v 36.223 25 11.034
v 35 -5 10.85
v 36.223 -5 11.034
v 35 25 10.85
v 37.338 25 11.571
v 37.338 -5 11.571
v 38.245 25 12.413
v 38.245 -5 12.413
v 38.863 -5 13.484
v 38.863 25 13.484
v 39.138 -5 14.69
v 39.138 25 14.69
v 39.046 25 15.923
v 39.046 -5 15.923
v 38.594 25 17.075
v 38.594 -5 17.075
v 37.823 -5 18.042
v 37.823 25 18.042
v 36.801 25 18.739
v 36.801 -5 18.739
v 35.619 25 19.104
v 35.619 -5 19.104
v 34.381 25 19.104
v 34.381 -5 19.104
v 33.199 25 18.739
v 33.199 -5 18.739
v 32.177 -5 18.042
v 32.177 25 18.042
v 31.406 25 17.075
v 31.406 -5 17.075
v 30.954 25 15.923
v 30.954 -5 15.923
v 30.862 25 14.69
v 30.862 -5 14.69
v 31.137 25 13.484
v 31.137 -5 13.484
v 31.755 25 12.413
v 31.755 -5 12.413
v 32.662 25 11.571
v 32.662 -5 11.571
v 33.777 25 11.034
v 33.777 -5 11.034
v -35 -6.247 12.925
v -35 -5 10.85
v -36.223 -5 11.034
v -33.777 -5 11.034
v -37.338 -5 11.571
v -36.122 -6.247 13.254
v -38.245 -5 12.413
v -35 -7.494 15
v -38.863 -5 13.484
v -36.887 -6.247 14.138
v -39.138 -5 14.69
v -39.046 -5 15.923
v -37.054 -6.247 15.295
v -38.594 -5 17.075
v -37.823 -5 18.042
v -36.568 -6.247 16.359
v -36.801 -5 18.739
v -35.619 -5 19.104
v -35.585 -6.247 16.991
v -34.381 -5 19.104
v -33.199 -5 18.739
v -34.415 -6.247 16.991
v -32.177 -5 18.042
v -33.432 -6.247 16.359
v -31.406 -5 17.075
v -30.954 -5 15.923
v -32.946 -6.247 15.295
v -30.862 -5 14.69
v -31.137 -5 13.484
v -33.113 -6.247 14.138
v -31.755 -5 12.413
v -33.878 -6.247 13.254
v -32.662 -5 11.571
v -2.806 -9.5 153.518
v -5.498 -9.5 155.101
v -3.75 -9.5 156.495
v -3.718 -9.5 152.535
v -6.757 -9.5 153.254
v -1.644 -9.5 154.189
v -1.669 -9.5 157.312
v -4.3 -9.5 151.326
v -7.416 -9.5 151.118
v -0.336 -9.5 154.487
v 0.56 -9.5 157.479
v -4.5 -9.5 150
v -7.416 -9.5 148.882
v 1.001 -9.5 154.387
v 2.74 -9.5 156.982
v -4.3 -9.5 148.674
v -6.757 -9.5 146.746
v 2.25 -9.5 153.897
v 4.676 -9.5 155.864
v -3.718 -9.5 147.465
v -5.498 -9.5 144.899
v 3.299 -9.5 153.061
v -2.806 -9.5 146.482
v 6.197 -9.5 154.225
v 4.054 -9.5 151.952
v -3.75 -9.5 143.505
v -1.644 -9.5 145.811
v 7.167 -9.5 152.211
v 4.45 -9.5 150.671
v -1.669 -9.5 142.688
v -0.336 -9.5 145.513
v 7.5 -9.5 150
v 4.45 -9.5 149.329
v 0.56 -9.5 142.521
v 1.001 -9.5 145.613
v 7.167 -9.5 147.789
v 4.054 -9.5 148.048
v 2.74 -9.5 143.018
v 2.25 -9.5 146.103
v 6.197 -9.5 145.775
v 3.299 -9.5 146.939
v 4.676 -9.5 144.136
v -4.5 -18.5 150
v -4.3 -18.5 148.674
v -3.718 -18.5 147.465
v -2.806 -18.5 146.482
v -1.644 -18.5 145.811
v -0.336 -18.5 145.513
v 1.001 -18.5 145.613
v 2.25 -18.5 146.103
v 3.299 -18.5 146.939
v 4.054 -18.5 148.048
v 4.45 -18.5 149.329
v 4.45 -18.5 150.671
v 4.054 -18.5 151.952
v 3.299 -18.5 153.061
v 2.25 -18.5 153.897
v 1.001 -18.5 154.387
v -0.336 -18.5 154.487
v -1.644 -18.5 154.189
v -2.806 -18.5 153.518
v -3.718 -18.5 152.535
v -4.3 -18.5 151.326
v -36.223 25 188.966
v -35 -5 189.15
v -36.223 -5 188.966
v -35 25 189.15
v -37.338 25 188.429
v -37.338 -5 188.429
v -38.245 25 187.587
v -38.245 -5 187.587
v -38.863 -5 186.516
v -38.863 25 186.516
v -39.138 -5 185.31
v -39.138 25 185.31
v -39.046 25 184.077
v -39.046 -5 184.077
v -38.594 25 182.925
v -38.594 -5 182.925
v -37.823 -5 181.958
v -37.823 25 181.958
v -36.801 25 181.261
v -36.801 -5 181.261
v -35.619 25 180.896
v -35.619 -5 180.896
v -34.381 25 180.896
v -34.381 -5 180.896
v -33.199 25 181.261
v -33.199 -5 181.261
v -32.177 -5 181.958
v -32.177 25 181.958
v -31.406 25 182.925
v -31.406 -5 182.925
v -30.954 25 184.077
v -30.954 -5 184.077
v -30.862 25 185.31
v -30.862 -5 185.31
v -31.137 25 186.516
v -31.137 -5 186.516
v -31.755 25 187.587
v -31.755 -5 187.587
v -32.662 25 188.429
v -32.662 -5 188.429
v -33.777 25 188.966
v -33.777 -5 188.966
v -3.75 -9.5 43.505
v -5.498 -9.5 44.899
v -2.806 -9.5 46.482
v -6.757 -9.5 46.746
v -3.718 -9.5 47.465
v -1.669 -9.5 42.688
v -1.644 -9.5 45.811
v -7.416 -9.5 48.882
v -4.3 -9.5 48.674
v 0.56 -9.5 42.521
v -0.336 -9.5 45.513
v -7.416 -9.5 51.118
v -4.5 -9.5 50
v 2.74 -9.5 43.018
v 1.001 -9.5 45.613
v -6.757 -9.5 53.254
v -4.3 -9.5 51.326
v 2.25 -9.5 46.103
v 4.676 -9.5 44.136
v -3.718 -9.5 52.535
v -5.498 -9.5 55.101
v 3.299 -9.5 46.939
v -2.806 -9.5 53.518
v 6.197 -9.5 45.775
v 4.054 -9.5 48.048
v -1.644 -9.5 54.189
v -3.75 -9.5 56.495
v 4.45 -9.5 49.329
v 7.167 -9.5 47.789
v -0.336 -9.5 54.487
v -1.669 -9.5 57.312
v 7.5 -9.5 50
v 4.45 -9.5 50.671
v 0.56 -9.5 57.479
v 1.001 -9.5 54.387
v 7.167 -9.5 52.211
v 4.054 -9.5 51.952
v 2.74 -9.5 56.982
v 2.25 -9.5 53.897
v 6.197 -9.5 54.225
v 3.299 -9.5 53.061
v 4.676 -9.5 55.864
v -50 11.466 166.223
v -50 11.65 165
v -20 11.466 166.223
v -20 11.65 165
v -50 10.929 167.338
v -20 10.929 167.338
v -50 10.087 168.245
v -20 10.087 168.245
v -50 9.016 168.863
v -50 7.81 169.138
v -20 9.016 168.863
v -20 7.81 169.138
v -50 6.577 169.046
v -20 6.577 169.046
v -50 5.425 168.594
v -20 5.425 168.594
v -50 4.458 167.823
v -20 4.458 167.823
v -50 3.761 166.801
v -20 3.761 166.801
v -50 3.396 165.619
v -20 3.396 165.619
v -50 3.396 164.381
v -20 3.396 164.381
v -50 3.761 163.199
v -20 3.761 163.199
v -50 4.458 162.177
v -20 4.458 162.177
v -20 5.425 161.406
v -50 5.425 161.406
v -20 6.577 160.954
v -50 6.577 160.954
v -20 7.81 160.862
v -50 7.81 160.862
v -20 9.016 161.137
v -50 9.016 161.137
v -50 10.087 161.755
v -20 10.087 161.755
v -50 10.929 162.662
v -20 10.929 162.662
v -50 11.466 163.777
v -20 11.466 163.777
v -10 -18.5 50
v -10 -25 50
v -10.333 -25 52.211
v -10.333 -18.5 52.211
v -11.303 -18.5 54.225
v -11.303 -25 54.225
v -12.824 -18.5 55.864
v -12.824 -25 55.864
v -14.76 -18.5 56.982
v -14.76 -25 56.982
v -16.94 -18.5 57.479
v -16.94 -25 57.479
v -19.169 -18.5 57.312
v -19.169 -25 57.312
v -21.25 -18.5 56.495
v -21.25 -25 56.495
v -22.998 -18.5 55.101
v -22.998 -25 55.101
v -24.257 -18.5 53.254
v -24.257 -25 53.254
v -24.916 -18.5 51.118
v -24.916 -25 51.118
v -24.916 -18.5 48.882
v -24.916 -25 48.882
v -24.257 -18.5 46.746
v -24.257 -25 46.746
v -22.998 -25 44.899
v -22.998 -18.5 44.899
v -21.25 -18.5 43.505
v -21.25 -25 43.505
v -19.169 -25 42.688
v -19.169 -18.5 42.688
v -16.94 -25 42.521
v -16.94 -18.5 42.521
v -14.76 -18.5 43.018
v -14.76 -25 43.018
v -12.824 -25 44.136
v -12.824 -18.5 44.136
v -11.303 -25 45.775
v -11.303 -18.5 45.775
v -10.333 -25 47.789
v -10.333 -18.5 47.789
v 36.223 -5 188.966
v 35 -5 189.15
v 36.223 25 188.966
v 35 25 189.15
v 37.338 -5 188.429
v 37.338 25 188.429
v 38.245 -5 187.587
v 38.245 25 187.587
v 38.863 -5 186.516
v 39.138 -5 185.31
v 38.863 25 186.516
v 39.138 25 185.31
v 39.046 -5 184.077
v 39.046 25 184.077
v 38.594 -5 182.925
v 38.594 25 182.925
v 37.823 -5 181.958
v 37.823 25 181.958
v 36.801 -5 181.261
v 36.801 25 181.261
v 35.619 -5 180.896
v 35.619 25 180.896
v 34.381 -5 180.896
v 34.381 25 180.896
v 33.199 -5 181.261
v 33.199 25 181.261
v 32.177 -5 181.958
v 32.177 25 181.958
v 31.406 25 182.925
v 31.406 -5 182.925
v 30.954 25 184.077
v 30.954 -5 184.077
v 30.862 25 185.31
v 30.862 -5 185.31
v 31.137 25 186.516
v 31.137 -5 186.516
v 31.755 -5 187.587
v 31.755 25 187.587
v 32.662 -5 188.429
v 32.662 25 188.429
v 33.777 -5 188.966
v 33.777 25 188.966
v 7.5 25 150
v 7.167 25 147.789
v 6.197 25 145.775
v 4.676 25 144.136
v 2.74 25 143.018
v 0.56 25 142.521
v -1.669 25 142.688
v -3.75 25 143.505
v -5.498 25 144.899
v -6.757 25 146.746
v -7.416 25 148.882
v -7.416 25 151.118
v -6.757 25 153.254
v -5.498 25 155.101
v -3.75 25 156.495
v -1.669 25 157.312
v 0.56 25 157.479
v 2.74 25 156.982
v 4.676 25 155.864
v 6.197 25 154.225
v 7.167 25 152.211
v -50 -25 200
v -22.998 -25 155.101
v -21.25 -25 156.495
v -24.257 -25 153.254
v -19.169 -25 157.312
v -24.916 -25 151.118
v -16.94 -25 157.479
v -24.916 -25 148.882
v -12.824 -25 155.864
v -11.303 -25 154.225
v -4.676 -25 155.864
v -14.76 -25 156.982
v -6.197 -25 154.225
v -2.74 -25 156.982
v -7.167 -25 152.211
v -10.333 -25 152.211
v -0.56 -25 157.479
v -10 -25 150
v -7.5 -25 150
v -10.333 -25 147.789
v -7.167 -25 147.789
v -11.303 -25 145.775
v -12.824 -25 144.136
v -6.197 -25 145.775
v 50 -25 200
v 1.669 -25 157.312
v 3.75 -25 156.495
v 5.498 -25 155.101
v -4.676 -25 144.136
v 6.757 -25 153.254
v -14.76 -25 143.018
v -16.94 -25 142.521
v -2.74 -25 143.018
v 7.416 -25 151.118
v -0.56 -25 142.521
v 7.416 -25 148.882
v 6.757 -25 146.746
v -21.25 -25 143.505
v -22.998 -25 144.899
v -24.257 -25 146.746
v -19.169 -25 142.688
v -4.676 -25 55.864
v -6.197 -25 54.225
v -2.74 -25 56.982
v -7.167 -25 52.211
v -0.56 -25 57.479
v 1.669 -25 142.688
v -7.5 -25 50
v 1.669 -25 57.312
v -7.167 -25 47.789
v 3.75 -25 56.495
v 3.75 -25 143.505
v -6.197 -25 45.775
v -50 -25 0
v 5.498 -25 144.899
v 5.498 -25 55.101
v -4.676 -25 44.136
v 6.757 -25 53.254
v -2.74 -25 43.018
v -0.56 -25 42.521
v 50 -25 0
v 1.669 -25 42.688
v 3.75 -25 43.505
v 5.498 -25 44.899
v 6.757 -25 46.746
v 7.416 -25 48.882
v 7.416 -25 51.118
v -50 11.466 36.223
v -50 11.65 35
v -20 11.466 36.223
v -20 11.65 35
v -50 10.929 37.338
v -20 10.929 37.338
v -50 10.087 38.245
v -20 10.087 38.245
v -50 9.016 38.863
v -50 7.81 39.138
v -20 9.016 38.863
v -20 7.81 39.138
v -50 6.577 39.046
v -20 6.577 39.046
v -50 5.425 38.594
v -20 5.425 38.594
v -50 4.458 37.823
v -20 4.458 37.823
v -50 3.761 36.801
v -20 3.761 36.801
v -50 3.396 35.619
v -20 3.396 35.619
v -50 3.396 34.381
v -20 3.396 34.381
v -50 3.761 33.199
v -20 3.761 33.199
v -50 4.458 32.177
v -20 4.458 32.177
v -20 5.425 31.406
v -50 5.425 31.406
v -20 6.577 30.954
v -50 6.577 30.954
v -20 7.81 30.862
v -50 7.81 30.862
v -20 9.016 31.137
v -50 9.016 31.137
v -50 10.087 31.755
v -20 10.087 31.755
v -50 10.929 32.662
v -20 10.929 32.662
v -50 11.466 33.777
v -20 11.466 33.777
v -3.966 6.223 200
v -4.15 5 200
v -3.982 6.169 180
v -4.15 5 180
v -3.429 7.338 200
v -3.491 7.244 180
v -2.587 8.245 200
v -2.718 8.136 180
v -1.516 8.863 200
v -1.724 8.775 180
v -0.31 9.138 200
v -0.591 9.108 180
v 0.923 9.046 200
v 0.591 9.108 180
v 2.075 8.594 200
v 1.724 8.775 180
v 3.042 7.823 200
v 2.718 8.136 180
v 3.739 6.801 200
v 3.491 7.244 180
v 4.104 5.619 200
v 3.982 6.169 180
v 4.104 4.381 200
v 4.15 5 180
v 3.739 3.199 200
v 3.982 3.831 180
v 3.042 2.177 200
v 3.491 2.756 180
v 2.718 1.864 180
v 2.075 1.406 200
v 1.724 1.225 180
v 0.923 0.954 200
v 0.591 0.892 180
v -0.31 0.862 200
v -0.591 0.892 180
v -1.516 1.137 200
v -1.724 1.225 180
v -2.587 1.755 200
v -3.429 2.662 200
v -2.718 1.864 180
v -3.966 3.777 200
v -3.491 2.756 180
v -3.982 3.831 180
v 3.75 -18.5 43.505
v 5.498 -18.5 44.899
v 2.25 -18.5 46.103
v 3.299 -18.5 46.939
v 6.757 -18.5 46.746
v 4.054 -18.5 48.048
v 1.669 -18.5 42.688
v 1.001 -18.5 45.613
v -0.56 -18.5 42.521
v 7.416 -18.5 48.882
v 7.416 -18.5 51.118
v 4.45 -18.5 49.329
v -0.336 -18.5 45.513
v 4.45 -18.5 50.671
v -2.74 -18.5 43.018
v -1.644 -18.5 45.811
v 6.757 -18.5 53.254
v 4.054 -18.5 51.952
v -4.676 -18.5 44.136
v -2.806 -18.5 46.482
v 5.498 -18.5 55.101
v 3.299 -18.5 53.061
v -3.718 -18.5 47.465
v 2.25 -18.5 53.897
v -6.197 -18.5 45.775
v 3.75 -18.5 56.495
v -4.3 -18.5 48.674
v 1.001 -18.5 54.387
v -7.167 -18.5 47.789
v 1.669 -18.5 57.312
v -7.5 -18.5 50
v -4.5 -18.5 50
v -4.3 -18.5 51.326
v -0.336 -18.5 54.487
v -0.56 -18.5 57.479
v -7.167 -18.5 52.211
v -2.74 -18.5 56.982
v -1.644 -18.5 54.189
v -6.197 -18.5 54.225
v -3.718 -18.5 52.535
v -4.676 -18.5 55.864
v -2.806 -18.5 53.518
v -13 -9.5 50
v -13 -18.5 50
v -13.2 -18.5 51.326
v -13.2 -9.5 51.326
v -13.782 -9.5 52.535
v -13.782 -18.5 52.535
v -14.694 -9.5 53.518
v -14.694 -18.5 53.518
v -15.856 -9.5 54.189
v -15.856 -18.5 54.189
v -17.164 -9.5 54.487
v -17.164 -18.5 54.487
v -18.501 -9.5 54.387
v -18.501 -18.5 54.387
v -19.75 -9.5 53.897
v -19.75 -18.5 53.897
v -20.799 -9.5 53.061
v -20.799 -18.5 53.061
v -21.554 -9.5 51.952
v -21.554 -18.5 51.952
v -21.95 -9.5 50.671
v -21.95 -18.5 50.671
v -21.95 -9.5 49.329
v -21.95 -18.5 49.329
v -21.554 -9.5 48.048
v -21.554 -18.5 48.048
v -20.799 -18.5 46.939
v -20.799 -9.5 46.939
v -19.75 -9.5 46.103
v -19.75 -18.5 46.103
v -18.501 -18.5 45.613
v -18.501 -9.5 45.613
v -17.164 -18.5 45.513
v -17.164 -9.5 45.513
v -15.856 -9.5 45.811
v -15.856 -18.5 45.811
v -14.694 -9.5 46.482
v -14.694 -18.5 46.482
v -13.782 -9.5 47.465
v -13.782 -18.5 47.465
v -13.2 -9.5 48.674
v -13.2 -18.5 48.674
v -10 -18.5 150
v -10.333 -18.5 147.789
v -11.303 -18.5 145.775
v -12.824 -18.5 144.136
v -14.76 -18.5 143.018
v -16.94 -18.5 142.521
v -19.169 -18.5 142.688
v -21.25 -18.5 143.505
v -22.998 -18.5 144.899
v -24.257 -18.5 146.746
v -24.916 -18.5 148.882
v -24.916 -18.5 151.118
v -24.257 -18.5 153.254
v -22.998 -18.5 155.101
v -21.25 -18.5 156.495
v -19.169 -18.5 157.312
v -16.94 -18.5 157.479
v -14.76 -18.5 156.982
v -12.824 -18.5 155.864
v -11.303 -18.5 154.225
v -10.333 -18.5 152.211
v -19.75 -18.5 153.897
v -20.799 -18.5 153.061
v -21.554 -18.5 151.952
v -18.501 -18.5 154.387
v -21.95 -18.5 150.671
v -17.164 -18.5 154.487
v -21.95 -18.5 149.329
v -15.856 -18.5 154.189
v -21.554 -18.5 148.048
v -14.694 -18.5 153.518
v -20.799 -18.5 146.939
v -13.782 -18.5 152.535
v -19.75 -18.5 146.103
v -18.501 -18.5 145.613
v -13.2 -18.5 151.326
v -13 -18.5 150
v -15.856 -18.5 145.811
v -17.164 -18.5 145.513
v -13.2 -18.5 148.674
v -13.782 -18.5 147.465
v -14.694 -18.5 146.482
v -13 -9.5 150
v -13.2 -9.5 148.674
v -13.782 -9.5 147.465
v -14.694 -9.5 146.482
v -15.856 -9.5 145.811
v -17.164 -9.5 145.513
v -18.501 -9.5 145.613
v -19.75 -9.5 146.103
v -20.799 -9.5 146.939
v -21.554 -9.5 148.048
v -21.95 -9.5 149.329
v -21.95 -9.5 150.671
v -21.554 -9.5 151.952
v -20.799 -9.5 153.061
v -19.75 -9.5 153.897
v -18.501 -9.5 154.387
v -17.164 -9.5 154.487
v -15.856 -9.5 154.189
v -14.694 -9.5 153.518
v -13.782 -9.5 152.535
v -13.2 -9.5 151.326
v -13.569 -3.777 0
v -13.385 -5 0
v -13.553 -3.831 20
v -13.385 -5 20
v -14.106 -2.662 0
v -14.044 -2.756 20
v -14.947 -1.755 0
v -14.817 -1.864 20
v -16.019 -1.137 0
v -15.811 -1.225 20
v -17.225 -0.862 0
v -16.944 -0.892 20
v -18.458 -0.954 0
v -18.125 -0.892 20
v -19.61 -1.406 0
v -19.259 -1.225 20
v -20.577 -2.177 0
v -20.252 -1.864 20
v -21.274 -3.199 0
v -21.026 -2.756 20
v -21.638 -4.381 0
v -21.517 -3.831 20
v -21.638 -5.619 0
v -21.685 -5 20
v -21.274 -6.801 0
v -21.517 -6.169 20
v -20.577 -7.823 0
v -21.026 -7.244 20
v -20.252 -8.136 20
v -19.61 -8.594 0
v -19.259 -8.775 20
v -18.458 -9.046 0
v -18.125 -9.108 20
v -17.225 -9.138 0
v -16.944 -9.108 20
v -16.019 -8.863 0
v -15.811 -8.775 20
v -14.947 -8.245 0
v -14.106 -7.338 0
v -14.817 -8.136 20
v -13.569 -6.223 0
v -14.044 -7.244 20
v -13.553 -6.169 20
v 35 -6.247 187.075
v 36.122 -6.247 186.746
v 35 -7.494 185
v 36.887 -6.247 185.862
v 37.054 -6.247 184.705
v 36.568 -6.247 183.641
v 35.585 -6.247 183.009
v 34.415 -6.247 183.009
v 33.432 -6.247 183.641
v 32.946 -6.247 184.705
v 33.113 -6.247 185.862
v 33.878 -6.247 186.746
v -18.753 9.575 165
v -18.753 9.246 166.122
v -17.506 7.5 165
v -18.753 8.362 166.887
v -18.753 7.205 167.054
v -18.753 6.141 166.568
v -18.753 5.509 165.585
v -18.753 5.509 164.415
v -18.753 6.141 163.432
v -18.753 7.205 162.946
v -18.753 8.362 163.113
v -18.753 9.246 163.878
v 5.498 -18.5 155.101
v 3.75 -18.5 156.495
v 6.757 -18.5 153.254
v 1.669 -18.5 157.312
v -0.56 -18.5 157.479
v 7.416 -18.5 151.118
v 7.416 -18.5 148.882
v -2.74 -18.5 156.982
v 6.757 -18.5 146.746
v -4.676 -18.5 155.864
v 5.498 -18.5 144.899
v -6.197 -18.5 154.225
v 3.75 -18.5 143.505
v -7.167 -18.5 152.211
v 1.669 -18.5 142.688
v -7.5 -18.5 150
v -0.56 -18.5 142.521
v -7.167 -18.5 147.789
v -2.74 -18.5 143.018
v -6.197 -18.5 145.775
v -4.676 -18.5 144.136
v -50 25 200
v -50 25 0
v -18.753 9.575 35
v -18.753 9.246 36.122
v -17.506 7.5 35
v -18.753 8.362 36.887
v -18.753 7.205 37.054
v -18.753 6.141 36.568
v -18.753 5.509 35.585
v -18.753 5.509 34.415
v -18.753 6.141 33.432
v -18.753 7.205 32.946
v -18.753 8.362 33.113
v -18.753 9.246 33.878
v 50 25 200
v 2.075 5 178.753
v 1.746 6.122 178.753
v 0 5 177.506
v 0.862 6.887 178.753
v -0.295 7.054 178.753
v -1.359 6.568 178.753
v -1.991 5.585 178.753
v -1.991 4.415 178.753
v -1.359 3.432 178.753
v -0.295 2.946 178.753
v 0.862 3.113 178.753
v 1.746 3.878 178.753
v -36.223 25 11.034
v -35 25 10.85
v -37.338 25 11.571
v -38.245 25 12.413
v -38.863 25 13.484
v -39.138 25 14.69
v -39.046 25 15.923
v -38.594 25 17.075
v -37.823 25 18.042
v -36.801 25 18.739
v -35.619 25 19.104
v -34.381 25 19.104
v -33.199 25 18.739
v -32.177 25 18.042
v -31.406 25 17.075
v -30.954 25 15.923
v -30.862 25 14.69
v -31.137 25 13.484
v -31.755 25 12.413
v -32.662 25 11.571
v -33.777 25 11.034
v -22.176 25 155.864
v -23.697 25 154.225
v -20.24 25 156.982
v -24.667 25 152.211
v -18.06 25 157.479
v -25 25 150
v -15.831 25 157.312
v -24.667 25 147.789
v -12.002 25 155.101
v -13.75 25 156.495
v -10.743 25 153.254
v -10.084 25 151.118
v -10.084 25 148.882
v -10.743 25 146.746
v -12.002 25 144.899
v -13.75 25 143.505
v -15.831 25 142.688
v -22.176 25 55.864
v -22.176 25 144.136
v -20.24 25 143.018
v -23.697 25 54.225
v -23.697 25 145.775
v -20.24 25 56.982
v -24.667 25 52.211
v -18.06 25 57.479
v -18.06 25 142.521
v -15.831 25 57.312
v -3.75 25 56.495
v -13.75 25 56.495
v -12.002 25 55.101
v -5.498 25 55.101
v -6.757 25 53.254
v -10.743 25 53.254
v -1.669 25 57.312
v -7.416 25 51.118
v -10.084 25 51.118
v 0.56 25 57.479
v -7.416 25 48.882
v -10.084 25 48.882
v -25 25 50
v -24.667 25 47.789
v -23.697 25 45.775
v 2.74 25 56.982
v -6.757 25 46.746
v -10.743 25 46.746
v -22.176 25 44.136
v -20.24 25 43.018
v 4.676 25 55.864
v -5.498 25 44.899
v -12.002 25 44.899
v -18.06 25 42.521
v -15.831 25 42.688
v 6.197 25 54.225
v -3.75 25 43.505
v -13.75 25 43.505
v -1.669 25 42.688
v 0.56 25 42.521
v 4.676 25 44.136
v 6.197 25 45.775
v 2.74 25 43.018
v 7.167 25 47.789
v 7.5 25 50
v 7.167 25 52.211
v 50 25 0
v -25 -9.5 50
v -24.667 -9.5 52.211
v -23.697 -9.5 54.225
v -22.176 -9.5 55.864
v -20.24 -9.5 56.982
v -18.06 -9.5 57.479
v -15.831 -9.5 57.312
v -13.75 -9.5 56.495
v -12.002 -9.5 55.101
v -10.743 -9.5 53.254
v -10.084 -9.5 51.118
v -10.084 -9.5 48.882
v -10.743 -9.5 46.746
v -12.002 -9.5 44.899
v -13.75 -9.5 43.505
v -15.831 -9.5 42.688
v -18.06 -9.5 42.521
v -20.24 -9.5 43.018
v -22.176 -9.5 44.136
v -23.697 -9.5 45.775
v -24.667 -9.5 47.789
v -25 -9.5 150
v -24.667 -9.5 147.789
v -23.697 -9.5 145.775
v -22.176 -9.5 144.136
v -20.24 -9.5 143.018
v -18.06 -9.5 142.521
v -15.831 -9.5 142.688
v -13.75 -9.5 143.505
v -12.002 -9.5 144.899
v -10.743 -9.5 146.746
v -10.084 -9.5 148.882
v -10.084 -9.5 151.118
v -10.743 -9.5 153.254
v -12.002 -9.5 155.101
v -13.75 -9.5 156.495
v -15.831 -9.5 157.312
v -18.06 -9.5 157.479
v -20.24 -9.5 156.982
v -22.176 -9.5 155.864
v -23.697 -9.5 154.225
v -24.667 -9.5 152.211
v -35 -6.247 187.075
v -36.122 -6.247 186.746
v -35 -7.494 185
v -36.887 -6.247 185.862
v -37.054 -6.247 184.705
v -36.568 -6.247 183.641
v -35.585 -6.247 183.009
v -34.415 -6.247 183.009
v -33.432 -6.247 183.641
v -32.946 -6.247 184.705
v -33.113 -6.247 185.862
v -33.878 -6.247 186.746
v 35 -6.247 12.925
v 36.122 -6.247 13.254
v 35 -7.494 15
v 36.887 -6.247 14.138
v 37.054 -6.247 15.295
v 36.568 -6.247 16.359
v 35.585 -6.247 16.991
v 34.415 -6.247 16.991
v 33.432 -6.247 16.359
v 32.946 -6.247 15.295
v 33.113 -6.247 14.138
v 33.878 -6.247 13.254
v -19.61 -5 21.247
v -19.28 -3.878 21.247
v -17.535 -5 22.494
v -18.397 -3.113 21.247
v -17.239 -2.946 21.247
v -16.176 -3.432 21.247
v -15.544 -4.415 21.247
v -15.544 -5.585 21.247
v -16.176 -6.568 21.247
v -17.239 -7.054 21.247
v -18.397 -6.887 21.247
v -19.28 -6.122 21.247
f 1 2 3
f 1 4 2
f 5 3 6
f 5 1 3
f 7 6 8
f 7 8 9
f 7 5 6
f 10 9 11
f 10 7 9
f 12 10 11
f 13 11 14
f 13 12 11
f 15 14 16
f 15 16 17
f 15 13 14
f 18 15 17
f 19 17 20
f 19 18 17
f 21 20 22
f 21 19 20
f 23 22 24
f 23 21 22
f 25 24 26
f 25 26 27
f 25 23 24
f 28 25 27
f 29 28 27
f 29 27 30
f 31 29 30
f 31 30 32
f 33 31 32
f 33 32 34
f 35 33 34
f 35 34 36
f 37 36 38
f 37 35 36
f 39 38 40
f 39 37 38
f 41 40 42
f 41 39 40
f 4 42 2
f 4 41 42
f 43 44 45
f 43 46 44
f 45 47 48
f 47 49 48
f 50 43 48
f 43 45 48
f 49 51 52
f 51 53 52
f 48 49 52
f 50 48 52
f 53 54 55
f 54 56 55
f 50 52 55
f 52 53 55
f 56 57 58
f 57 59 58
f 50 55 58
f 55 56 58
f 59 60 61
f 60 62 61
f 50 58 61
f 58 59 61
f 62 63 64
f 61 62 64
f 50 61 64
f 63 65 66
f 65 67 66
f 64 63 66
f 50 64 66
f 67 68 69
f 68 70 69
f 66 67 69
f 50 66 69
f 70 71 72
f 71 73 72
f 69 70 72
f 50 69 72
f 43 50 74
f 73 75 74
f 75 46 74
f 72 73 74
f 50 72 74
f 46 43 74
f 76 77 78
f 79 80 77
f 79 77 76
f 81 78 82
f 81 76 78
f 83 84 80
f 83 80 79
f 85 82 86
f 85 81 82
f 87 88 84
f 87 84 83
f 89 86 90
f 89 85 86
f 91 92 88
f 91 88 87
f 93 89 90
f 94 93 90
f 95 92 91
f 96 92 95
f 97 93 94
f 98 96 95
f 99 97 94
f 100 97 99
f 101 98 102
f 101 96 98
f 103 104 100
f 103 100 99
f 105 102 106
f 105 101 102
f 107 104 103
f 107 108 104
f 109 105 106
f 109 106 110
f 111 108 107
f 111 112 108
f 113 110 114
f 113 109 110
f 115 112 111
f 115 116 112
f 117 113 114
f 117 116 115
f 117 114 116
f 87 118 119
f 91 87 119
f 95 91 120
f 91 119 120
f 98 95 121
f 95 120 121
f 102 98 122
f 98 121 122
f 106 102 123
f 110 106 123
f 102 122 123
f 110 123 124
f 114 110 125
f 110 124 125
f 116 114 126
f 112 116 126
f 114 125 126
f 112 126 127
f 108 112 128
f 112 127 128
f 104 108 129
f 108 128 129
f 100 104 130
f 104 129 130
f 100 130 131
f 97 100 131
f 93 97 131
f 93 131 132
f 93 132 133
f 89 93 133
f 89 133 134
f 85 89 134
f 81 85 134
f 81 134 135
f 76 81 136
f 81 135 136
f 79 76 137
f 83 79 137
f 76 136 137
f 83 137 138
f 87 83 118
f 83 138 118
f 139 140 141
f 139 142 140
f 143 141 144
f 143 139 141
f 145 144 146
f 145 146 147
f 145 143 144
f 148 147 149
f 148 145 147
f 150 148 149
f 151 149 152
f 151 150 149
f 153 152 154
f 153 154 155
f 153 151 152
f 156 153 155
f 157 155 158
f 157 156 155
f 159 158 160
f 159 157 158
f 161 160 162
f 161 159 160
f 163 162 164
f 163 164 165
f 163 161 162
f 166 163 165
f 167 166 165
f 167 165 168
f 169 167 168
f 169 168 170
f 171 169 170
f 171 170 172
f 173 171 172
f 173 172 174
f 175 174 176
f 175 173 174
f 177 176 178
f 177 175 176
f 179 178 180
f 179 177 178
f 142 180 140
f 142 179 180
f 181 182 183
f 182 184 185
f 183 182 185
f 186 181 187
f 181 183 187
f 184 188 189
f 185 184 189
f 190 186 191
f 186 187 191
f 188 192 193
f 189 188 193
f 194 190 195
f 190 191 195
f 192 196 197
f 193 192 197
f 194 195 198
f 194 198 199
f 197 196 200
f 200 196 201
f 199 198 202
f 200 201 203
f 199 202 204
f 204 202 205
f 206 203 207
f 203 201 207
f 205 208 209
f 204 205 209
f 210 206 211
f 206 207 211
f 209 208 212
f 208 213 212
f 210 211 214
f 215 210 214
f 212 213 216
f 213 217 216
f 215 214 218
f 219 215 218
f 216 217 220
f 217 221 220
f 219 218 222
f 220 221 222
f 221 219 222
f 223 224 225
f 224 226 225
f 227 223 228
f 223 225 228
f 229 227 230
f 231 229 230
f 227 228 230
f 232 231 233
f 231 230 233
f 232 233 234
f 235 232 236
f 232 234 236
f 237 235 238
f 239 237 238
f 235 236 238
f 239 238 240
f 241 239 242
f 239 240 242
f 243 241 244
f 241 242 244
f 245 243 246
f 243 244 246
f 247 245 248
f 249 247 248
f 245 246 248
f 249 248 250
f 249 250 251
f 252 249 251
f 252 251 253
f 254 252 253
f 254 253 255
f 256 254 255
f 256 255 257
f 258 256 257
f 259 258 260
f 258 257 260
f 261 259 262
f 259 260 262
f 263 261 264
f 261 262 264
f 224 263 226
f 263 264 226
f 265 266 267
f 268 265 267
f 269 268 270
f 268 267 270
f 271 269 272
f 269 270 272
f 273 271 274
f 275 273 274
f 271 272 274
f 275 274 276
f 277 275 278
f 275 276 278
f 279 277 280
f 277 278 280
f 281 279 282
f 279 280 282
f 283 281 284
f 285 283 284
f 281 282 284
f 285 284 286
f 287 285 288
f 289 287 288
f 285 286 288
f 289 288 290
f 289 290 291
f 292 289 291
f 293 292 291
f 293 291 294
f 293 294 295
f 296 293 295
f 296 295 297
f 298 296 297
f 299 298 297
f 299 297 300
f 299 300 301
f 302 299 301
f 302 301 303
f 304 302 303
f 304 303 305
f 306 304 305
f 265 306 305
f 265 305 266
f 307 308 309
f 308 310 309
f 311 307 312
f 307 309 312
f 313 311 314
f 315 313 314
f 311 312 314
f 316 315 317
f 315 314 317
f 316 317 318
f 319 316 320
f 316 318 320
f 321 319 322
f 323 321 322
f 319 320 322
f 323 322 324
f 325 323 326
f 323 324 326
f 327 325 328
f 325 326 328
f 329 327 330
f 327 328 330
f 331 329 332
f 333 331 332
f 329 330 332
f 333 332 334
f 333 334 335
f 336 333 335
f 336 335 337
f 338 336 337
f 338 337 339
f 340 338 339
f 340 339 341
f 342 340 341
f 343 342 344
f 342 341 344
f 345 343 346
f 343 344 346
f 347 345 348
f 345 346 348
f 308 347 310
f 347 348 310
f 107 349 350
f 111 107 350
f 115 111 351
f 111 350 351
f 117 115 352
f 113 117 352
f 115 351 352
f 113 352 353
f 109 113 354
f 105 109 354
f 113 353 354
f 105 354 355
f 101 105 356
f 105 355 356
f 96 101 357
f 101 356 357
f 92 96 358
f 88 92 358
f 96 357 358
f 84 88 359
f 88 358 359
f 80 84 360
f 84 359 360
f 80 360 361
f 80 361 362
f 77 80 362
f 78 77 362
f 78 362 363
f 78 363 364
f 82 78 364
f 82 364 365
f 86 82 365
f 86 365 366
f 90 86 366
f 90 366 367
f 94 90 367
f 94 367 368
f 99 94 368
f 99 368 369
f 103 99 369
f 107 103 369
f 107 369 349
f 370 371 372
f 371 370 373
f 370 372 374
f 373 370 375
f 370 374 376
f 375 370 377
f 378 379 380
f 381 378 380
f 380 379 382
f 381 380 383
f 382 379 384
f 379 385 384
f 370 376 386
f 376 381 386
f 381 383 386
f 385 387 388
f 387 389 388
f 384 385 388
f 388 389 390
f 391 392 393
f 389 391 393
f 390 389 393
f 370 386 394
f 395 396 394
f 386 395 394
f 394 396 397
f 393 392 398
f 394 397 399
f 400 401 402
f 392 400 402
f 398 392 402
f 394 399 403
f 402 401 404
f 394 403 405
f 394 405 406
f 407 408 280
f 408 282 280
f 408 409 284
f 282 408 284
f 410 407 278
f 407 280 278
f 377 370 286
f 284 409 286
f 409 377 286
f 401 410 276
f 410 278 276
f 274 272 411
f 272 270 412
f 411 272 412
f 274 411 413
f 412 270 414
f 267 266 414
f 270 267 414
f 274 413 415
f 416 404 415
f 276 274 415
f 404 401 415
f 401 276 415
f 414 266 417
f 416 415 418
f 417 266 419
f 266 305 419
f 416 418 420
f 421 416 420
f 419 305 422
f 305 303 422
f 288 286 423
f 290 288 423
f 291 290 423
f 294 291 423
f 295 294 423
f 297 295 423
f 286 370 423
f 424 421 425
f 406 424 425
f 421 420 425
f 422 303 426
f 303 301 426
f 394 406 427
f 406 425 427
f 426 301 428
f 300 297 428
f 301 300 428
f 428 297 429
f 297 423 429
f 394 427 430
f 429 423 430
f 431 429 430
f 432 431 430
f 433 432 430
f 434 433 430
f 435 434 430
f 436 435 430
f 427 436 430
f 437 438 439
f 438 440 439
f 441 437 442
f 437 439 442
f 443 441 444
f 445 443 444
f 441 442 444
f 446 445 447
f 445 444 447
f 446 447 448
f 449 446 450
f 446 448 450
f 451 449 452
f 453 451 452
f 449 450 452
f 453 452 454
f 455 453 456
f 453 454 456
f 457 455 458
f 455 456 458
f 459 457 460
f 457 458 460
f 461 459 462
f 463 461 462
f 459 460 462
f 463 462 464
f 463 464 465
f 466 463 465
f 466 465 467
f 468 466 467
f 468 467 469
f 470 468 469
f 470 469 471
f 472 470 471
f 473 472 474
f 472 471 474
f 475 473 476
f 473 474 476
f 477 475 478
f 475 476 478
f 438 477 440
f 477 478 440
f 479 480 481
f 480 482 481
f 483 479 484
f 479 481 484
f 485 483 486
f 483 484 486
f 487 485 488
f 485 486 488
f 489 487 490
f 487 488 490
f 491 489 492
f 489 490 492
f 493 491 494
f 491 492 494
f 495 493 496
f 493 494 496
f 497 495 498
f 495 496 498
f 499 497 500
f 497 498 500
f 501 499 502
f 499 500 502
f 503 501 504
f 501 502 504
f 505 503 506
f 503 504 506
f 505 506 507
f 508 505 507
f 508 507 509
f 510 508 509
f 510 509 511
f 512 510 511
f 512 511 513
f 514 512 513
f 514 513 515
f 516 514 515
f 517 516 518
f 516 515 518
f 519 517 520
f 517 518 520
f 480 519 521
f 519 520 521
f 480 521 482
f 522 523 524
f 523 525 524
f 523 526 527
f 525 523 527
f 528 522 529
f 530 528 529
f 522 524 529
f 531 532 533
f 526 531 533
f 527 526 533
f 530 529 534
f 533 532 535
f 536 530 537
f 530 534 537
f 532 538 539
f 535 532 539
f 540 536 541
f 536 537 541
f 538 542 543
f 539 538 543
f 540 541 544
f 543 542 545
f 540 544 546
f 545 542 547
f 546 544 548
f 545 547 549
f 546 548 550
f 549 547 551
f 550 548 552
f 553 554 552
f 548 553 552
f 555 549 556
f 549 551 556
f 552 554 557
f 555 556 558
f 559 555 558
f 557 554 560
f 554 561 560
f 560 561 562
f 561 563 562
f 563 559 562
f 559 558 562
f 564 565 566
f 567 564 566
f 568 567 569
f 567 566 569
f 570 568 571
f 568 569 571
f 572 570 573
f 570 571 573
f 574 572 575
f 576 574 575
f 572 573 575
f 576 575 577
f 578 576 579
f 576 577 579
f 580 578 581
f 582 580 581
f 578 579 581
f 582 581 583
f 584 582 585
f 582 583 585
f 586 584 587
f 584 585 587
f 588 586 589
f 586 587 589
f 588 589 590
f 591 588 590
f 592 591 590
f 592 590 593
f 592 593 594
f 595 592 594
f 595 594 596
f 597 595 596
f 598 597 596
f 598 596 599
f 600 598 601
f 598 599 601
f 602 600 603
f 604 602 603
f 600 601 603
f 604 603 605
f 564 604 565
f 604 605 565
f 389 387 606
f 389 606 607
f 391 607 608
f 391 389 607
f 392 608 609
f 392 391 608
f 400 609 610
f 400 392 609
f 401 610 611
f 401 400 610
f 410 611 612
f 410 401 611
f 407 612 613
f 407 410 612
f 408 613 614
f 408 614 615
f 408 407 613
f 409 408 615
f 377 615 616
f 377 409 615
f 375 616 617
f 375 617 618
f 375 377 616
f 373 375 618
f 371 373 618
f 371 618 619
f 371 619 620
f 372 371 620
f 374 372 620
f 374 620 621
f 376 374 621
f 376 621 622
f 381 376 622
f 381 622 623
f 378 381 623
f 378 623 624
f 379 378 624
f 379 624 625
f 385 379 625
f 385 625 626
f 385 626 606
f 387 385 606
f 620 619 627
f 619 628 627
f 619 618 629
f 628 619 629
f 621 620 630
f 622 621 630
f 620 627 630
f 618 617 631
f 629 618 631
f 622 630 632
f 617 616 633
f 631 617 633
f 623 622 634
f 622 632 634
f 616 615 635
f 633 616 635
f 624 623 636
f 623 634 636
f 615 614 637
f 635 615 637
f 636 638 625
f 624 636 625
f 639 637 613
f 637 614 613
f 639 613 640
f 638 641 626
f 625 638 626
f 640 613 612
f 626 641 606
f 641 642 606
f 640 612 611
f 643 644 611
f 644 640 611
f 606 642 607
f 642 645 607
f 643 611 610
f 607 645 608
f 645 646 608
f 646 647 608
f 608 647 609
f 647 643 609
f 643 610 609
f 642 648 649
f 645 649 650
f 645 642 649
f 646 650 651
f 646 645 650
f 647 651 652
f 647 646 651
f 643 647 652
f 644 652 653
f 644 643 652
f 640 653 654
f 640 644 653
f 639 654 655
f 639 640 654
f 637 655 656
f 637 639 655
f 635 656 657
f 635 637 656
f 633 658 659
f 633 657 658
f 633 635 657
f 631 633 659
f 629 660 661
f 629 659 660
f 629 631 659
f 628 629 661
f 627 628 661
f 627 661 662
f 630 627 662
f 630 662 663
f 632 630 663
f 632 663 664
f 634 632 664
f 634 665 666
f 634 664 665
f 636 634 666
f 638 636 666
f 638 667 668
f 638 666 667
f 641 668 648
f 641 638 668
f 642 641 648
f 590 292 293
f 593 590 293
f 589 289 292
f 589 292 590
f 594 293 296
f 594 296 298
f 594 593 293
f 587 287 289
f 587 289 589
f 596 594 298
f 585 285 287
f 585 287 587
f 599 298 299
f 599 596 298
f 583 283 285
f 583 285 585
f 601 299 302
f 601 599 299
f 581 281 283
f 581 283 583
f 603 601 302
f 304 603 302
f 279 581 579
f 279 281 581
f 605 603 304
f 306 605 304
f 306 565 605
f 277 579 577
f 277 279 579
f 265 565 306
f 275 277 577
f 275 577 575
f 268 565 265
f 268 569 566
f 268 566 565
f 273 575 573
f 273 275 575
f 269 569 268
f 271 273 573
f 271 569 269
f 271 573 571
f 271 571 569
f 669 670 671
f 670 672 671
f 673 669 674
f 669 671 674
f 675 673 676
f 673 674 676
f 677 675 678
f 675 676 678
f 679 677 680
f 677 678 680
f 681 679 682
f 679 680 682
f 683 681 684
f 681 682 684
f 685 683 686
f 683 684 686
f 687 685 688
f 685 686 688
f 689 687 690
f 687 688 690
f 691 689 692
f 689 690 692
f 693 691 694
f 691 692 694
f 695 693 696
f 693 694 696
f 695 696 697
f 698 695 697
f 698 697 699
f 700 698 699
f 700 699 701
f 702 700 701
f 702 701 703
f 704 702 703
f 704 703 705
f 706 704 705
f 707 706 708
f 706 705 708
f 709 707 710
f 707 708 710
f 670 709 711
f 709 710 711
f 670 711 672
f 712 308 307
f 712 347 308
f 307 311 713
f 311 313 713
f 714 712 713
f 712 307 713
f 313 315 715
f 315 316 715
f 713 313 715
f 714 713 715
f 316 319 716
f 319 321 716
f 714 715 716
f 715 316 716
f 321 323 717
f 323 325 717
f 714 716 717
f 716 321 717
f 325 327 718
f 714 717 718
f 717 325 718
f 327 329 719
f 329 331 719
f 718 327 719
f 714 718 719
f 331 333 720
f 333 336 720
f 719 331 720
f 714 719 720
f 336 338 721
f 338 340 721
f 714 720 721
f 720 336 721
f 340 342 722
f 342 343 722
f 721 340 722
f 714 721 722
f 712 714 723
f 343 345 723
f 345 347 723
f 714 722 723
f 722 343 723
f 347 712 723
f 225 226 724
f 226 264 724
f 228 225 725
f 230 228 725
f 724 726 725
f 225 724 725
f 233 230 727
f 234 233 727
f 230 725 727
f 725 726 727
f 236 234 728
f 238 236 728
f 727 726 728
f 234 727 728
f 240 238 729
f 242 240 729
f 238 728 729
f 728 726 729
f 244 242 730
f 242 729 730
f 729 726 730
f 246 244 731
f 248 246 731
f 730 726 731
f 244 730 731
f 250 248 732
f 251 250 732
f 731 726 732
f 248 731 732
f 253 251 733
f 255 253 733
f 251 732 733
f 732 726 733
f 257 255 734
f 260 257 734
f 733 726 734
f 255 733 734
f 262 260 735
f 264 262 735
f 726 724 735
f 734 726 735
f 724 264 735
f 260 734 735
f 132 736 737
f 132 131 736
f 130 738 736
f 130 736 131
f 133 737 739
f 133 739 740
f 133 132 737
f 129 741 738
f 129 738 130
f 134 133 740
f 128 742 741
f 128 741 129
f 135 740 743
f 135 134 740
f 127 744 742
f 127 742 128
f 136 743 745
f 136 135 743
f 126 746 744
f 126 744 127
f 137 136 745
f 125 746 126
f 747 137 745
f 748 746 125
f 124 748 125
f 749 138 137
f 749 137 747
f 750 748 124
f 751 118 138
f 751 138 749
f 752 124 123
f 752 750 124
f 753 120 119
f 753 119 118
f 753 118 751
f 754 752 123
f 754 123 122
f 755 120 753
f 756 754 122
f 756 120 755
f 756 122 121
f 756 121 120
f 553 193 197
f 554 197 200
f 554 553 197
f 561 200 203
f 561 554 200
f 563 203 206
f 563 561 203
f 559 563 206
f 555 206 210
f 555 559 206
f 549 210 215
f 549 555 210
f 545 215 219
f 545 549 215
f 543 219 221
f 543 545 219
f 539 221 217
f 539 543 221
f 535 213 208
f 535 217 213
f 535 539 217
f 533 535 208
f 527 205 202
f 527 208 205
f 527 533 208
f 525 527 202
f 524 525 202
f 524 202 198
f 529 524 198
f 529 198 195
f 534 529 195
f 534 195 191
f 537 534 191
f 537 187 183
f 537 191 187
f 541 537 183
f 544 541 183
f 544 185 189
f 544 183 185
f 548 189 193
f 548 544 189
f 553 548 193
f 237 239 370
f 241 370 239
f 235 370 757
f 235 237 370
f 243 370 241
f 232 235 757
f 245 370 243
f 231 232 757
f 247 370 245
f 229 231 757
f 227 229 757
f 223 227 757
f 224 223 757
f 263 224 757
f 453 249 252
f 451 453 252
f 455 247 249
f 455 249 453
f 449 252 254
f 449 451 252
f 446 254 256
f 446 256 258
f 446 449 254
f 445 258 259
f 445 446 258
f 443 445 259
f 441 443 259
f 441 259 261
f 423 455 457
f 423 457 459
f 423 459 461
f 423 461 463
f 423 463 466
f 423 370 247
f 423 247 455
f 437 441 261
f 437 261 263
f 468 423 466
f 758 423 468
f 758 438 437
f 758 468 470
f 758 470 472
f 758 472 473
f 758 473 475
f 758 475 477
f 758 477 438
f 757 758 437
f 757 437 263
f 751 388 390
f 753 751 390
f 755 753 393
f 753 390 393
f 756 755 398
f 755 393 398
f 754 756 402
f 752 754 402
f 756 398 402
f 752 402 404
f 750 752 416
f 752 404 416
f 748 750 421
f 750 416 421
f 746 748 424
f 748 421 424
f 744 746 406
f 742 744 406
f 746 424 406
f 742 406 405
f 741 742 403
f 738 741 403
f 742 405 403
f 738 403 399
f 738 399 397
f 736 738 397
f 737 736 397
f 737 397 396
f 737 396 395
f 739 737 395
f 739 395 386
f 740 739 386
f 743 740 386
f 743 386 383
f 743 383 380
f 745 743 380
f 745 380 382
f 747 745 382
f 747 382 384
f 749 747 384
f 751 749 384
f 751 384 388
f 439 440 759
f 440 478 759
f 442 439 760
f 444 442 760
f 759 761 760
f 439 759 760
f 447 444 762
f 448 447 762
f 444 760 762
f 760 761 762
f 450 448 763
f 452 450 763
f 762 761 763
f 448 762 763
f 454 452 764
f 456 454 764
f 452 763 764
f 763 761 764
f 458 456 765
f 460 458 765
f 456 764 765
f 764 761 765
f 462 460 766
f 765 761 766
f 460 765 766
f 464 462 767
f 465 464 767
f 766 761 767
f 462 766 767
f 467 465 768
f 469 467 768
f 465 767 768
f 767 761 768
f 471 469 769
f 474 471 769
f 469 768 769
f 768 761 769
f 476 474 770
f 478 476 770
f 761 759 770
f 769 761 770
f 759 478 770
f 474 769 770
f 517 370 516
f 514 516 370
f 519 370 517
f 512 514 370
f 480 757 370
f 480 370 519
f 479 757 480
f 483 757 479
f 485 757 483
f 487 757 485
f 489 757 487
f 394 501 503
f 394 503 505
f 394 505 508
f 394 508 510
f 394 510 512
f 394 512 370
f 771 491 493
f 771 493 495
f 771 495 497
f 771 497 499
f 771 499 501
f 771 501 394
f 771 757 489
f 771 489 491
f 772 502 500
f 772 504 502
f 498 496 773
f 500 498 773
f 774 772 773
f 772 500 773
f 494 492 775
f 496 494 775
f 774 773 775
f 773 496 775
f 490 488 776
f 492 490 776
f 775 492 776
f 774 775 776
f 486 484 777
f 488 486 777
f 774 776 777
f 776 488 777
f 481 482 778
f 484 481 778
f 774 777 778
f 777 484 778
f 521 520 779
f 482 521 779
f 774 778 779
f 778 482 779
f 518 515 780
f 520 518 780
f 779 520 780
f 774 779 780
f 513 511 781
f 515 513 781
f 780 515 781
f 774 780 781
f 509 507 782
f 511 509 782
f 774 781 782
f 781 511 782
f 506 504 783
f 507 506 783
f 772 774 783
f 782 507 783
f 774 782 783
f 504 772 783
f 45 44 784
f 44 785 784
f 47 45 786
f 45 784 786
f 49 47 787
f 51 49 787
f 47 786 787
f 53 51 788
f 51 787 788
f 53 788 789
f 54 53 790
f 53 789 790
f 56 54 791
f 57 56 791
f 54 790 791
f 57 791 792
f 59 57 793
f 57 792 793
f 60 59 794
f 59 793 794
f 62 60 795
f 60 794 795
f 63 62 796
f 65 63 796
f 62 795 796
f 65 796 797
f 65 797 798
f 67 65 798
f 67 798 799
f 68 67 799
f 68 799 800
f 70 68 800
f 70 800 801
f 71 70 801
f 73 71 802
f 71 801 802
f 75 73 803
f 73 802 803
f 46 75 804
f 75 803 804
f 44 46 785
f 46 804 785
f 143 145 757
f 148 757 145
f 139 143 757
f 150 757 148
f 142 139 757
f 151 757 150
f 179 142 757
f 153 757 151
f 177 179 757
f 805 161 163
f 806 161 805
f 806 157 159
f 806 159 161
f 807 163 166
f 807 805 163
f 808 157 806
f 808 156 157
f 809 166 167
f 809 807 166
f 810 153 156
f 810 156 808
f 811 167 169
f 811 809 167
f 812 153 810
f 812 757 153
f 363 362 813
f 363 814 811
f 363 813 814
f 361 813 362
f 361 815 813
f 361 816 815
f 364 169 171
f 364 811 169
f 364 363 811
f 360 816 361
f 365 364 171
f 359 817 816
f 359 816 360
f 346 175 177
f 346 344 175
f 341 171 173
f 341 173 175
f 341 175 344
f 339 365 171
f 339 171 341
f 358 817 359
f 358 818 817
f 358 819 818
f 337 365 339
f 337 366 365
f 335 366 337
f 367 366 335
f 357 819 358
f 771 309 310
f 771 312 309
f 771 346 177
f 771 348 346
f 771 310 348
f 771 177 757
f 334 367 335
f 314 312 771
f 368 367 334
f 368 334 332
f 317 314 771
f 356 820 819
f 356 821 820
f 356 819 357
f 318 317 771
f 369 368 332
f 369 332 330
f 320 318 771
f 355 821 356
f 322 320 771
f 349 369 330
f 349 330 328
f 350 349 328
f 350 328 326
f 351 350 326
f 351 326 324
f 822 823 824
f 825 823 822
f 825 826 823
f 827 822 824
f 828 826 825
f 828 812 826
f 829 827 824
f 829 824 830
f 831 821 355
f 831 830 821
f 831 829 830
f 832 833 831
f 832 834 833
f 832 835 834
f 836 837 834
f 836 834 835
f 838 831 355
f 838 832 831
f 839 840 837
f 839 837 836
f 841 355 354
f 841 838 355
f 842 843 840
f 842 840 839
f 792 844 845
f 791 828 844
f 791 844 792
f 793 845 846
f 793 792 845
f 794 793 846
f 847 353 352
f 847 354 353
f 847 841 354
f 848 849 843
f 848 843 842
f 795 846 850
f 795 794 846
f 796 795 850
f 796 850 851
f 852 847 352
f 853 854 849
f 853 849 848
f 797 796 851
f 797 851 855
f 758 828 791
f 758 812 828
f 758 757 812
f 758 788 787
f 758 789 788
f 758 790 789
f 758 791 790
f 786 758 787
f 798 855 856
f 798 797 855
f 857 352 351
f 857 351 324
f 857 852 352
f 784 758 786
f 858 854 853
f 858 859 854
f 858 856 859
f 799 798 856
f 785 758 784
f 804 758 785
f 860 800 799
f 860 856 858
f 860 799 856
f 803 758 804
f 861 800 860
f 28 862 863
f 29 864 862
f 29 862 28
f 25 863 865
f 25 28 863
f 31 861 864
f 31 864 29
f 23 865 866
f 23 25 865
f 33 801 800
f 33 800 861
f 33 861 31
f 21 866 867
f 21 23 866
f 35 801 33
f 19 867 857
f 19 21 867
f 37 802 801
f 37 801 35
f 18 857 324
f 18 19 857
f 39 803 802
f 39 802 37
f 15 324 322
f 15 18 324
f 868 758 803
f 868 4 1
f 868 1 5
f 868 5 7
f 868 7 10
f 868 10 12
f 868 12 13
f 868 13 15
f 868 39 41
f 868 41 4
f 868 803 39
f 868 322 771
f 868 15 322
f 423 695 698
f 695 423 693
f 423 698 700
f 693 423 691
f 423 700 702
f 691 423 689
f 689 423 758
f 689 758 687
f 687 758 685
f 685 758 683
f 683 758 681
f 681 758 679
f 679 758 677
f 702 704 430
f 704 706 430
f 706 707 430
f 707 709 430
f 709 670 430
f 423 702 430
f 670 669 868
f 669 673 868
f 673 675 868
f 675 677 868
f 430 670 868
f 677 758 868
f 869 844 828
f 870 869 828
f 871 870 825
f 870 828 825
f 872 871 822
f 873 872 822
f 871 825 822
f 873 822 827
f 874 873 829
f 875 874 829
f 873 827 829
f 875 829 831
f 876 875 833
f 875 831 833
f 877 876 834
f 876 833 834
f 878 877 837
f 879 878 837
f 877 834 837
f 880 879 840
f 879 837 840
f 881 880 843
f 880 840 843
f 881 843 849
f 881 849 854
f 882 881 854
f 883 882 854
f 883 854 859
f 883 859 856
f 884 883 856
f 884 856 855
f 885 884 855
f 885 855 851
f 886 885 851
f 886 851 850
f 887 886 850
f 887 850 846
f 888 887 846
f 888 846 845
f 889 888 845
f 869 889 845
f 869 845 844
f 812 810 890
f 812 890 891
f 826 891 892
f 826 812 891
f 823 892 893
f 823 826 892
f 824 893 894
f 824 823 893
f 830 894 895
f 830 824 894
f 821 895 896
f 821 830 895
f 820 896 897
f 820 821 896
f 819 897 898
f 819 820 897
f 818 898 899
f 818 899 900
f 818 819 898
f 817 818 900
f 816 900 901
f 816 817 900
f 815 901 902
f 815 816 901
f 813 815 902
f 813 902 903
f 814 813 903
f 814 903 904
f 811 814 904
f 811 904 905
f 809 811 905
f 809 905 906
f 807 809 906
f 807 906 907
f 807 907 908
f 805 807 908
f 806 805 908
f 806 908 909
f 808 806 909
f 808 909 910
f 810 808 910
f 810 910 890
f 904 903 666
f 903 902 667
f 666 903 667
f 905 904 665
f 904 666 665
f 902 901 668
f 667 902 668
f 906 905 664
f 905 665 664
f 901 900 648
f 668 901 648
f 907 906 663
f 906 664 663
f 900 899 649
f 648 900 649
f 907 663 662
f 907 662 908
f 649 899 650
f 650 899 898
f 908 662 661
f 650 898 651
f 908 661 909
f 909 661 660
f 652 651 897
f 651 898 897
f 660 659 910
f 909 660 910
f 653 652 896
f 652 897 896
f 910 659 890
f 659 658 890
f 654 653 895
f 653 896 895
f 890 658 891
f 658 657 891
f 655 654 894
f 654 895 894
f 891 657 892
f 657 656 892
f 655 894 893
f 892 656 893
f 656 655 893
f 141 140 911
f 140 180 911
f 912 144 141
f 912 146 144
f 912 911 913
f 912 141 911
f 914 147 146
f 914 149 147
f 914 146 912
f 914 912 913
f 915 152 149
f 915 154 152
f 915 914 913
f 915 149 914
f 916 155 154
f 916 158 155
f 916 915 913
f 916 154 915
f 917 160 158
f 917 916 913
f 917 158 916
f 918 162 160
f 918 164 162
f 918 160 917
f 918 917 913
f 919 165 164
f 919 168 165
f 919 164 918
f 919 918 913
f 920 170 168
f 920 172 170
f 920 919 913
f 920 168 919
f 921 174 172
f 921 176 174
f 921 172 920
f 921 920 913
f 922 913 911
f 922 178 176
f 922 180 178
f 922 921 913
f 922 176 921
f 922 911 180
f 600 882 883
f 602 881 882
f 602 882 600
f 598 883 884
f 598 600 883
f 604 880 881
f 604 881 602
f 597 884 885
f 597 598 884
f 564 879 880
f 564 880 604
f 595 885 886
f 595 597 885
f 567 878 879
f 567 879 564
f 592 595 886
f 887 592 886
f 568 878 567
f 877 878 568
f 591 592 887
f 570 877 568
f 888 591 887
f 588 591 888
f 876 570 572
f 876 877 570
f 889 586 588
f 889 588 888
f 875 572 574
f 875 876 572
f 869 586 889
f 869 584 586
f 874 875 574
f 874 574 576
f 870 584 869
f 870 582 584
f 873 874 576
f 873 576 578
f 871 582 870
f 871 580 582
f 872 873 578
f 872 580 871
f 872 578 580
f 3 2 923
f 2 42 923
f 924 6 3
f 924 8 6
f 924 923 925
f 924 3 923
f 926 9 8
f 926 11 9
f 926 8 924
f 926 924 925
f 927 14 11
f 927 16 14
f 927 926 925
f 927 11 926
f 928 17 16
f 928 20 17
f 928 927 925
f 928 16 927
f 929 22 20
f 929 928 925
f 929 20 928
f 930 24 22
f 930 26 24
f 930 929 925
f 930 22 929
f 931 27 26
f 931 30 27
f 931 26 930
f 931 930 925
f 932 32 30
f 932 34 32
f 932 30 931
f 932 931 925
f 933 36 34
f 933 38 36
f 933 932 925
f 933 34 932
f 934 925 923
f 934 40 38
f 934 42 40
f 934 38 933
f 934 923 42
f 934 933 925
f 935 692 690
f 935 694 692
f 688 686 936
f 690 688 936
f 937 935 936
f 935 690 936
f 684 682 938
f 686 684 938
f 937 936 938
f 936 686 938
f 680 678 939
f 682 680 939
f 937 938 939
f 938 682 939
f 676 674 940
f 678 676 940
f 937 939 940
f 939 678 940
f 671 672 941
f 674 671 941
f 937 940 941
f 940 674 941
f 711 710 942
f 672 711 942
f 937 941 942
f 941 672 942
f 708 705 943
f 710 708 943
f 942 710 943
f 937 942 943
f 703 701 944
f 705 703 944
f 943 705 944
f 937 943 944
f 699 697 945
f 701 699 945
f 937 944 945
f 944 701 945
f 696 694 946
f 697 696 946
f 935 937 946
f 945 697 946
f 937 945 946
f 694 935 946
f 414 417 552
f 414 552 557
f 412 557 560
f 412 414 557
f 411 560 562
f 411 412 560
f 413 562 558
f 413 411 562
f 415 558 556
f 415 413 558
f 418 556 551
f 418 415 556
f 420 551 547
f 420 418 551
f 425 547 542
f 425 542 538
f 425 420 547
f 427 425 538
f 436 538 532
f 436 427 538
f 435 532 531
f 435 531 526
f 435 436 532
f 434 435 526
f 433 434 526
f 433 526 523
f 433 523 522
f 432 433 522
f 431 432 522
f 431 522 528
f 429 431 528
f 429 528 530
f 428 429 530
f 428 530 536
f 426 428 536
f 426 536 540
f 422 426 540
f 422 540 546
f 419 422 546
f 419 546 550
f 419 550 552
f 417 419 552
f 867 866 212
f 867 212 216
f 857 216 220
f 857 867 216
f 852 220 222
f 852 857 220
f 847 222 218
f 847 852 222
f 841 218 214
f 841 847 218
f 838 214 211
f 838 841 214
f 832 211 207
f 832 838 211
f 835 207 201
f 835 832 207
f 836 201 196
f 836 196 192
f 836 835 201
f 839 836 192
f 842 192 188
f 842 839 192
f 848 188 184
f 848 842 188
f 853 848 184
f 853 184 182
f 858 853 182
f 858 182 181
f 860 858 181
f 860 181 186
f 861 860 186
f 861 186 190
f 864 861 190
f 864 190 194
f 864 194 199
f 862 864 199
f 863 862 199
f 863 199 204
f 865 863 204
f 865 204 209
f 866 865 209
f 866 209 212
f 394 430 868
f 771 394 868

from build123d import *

# Parameters (mm, degrees)
SKIZZE1_W                                           = 100
SKIZZE1_H                                           = 50
AUFSATZ_LINEAR_AUSTRAGEN1_DEPTH                     = 200
STIRNSENKUNG_F_R_M8_SENKSCHRAUBE_KOPF_B_D           = 9
STIRNSENKUNG_F_R_M8_SENKSCHRAUBE_KOPF_B_CBORE_D     = 15
STIRNSENKUNG_F_R_M8_SENKSCHRAUBE_KOPF_B_CBORE_DEPTH = 34.5
STIRNSENKUNG_F_R_M8_SENKSCHRAUBE_KO_2_D             = 9
STIRNSENKUNG_F_R_M8_SENKSCHRAUBE_KO_2_DEPTH         = 50
STIRNSENKUNG_F_R_M8_SENKSCHRAUBE_KO_2_CBORE_D       = 15
STIRNSENKUNG_F_R_M8_SENKSCHRAUBE_KO_2_CBORE_DEPTH   = 6.5
SPIEGELN4_COPY_1_D                                  = 9
SPIEGELN4_COPY_1_CBORE_D                            = 15
SPIEGELN4_COPY_1_CBORE_DEPTH                        = 34.5
SPIEGELN4_COPY_2_D                                  = 9
SPIEGELN4_COPY_2_DEPTH                              = 50
SPIEGELN4_COPY_2_CBORE_D                            = 15
SPIEGELN4_COPY_2_CBORE_DEPTH                        = 6.5
KERNLOCH_F_R_M8_HELICOIL3_D                         = 8.3
KERNLOCH_F_R_M8_HELICOIL3_DEPTH                     = 20
KERNLOCH_F_R_M8_HELICOIL3_TIP                       = 2.493571569
KERNLOCH_F_R_M8_HELICOIL4_D                         = 8.3
KERNLOCH_F_R_M8_HELICOIL4_DEPTH                     = 20
KERNLOCH_F_R_M8_HELICOIL4_TIP                       = 2.493571569


# Read off the part's stored shape, not the designer's step: Kernloch für M8 Helicoil2
with BuildPart() as part:
    # Skizze1 → Aufsatz-Linear austragen1 (new body)
    with BuildSketch(Plane.XY):
        Rectangle(SKIZZE1_W, SKIZZE1_H)
    extrude(amount=AUFSATZ_LINEAR_AUSTRAGEN1_DEPTH)

    # Stirnsenkung f_r M8 Senkschraube _Kopf B (through all)
    with Locations(Plane(origin=(0, 25, 0), x_dir=(1, 0, 0), z_dir=(0, 1, 0))):
        with Locations((0, -150)):
            stirnsenkung_f_r_m8_senkschraube_kopf_b = CounterBoreHole(STIRNSENKUNG_F_R_M8_SENKSCHRAUBE_KOPF_B_D / 2, STIRNSENKUNG_F_R_M8_SENKSCHRAUBE_KOPF_B_CBORE_D / 2, STIRNSENKUNG_F_R_M8_SENKSCHRAUBE_KOPF_B_CBORE_DEPTH)

    # Stirnsenkung f_r M8 Senkschraube _Ko 2
    with Locations(Plane(origin=(0, -25, 0), x_dir=(-1, 0, 0), z_dir=(0, -1, 0))):
        with Locations((0, -150)):
            stirnsenkung_f_r_m8_senkschraube_ko_2 = CounterBoreHole(STIRNSENKUNG_F_R_M8_SENKSCHRAUBE_KO_2_D / 2, STIRNSENKUNG_F_R_M8_SENKSCHRAUBE_KO_2_CBORE_D / 2, STIRNSENKUNG_F_R_M8_SENKSCHRAUBE_KO_2_CBORE_DEPTH, depth=STIRNSENKUNG_F_R_M8_SENKSCHRAUBE_KO_2_DEPTH)

    # Spiegeln1: Stirnsenkung f_r M8 Senkschraube _Kopf B, Stirnsenkung f_r M8 Senkschraube _Ko 2 across plane
    add(stirnsenkung_f_r_m8_senkschraube_kopf_b.mirror(Plane.XY.offset(100)), mode=Mode.SUBTRACT)
    add(stirnsenkung_f_r_m8_senkschraube_ko_2.mirror(Plane.XY.offset(100)), mode=Mode.SUBTRACT)

    # Skizze10 → Kernloch für M8 Helicoil1 (revolve, cut)
    with BuildSketch(Plane(origin=(-35, 25, 185), x_dir=(0, 0, 1), z_dir=(1, 0, 0))):
        Polygon((0, 0), (0, 32.493571569), (4.15, 30), (4.15, 0), align=None)
    kernloch_f_r_m8_helicoil1 = revolve(axis=Axis((-35, 31.35, 185), (0, -1, 0)), mode=Mode.SUBTRACT)

    # Spiegeln2: Kernloch für M8 Helicoil1 across plane
    add(kernloch_f_r_m8_helicoil1.mirror(Plane(origin=(0, 0, 0), x_dir=(0, 0, 1), z_dir=(1, 0, 0))), mode=Mode.SUBTRACT)

    # Spiegeln3: Kernloch für M8 Helicoil1 across plane
    add(kernloch_f_r_m8_helicoil1.mirror(Plane.XY.offset(100)), mode=Mode.SUBTRACT)

    # Spiegeln3 copy 1 sketch → Spiegeln3 copy 1 (revolve, cut)
    with BuildSketch(Plane(origin=(35, 25, 15), x_dir=(0, 0, -1), z_dir=(-1, 0, 0))):
        Polygon((0, 0), (0, 32.493571569), (4.15, 30), (4.15, 0), align=None)
    revolve(axis=Axis((35, 31.35, 15), (0, -1, 0)), mode=Mode.SUBTRACT)

    # Kernloch für M8 Helicoil2 outline → Kernloch für M8 Helicoil2 (revolve, cut)
    with BuildSketch(Plane(origin=(0, 7.5, 35), x_dir=(0, 1, 0), z_dir=(0, 0, -1))):
        Polygon((4.15, -20), (0, -17.506428431), (0, -50), (4.15, -50), align=None)
    revolve(axis=Axis((0, 7.5, 35), (1, 0, 0)), mode=Mode.SUBTRACT)

    # Kernloch f_r M8 Helicoil2 2 outline → Kernloch f_r M8 Helicoil2 2 (revolve, cut)
    with BuildSketch(Plane(origin=(0, 7.5, 165), x_dir=(0, 1, 0), z_dir=(0, 0, -1))):
        Polygon((4.15, -20), (0, -17.506428431), (0, -50), (4.15, -50), align=None)
    revolve(axis=Axis((0, 7.5, 165), (1, 0, 0)), mode=Mode.SUBTRACT)

    # Spiegeln4: Stirnsenkung f_r M8 Senkschraube _Kopf B, Stirnsenkung f_r M8 Senkschraube _Ko 2 across plane
    add(stirnsenkung_f_r_m8_senkschraube_kopf_b.mirror(Plane(origin=(-8.75, 0, 0), x_dir=(0, 0, 1), z_dir=(1, 0, 0))), mode=Mode.SUBTRACT)
    add(stirnsenkung_f_r_m8_senkschraube_ko_2.mirror(Plane(origin=(-8.75, 0, 0), x_dir=(0, 0, 1), z_dir=(1, 0, 0))), mode=Mode.SUBTRACT)

    # Spiegeln4 copy 1 (through all)
    with Locations(Plane(origin=(-17.5, 25, 200), x_dir=(-1, 0, 0), z_dir=(0, 1, 0))):
        with Locations((0, -150)):
            CounterBoreHole(SPIEGELN4_COPY_1_D / 2, SPIEGELN4_COPY_1_CBORE_D / 2, SPIEGELN4_COPY_1_CBORE_DEPTH)

    # Spiegeln4 copy 2
    with Locations(Plane(origin=(-17.5, -25, 200), x_dir=(1, 0, 0), z_dir=(0, -1, 0))):
        with Locations((0, -150)):
            CounterBoreHole(SPIEGELN4_COPY_2_D / 2, SPIEGELN4_COPY_2_CBORE_D / 2, SPIEGELN4_COPY_2_CBORE_DEPTH, depth=SPIEGELN4_COPY_2_DEPTH)

    # Kernloch für M8 Helicoil3
    with Locations(Plane.XY.offset(200)):
        with Locations((4.444e-06, 5)):
            Hole(KERNLOCH_F_R_M8_HELICOIL3_D / 2, depth=KERNLOCH_F_R_M8_HELICOIL3_DEPTH)
            with Locations((0, 0, -(KERNLOCH_F_R_M8_HELICOIL3_DEPTH + KERNLOCH_F_R_M8_HELICOIL3_TIP / 2))):  # 118° drill point
                Cone(0, KERNLOCH_F_R_M8_HELICOIL3_D / 2, KERNLOCH_F_R_M8_HELICOIL3_TIP, mode=Mode.SUBTRACT)

    # Kernloch für M8 Helicoil4
    with Locations(Plane(origin=(0, 0, 0), x_dir=(-1, 0, 0), z_dir=(0, 0, -1))):
        with Locations((17.534722222, -5)):
            Hole(KERNLOCH_F_R_M8_HELICOIL4_D / 2, depth=KERNLOCH_F_R_M8_HELICOIL4_DEPTH)
            with Locations((0, 0, -(KERNLOCH_F_R_M8_HELICOIL4_DEPTH + KERNLOCH_F_R_M8_HELICOIL4_TIP / 2))):  # 118° drill point
                Cone(0, KERNLOCH_F_R_M8_HELICOIL4_D / 2, KERNLOCH_F_R_M8_HELICOIL4_TIP, mode=Mode.SUBTRACT)


solid = part.part
